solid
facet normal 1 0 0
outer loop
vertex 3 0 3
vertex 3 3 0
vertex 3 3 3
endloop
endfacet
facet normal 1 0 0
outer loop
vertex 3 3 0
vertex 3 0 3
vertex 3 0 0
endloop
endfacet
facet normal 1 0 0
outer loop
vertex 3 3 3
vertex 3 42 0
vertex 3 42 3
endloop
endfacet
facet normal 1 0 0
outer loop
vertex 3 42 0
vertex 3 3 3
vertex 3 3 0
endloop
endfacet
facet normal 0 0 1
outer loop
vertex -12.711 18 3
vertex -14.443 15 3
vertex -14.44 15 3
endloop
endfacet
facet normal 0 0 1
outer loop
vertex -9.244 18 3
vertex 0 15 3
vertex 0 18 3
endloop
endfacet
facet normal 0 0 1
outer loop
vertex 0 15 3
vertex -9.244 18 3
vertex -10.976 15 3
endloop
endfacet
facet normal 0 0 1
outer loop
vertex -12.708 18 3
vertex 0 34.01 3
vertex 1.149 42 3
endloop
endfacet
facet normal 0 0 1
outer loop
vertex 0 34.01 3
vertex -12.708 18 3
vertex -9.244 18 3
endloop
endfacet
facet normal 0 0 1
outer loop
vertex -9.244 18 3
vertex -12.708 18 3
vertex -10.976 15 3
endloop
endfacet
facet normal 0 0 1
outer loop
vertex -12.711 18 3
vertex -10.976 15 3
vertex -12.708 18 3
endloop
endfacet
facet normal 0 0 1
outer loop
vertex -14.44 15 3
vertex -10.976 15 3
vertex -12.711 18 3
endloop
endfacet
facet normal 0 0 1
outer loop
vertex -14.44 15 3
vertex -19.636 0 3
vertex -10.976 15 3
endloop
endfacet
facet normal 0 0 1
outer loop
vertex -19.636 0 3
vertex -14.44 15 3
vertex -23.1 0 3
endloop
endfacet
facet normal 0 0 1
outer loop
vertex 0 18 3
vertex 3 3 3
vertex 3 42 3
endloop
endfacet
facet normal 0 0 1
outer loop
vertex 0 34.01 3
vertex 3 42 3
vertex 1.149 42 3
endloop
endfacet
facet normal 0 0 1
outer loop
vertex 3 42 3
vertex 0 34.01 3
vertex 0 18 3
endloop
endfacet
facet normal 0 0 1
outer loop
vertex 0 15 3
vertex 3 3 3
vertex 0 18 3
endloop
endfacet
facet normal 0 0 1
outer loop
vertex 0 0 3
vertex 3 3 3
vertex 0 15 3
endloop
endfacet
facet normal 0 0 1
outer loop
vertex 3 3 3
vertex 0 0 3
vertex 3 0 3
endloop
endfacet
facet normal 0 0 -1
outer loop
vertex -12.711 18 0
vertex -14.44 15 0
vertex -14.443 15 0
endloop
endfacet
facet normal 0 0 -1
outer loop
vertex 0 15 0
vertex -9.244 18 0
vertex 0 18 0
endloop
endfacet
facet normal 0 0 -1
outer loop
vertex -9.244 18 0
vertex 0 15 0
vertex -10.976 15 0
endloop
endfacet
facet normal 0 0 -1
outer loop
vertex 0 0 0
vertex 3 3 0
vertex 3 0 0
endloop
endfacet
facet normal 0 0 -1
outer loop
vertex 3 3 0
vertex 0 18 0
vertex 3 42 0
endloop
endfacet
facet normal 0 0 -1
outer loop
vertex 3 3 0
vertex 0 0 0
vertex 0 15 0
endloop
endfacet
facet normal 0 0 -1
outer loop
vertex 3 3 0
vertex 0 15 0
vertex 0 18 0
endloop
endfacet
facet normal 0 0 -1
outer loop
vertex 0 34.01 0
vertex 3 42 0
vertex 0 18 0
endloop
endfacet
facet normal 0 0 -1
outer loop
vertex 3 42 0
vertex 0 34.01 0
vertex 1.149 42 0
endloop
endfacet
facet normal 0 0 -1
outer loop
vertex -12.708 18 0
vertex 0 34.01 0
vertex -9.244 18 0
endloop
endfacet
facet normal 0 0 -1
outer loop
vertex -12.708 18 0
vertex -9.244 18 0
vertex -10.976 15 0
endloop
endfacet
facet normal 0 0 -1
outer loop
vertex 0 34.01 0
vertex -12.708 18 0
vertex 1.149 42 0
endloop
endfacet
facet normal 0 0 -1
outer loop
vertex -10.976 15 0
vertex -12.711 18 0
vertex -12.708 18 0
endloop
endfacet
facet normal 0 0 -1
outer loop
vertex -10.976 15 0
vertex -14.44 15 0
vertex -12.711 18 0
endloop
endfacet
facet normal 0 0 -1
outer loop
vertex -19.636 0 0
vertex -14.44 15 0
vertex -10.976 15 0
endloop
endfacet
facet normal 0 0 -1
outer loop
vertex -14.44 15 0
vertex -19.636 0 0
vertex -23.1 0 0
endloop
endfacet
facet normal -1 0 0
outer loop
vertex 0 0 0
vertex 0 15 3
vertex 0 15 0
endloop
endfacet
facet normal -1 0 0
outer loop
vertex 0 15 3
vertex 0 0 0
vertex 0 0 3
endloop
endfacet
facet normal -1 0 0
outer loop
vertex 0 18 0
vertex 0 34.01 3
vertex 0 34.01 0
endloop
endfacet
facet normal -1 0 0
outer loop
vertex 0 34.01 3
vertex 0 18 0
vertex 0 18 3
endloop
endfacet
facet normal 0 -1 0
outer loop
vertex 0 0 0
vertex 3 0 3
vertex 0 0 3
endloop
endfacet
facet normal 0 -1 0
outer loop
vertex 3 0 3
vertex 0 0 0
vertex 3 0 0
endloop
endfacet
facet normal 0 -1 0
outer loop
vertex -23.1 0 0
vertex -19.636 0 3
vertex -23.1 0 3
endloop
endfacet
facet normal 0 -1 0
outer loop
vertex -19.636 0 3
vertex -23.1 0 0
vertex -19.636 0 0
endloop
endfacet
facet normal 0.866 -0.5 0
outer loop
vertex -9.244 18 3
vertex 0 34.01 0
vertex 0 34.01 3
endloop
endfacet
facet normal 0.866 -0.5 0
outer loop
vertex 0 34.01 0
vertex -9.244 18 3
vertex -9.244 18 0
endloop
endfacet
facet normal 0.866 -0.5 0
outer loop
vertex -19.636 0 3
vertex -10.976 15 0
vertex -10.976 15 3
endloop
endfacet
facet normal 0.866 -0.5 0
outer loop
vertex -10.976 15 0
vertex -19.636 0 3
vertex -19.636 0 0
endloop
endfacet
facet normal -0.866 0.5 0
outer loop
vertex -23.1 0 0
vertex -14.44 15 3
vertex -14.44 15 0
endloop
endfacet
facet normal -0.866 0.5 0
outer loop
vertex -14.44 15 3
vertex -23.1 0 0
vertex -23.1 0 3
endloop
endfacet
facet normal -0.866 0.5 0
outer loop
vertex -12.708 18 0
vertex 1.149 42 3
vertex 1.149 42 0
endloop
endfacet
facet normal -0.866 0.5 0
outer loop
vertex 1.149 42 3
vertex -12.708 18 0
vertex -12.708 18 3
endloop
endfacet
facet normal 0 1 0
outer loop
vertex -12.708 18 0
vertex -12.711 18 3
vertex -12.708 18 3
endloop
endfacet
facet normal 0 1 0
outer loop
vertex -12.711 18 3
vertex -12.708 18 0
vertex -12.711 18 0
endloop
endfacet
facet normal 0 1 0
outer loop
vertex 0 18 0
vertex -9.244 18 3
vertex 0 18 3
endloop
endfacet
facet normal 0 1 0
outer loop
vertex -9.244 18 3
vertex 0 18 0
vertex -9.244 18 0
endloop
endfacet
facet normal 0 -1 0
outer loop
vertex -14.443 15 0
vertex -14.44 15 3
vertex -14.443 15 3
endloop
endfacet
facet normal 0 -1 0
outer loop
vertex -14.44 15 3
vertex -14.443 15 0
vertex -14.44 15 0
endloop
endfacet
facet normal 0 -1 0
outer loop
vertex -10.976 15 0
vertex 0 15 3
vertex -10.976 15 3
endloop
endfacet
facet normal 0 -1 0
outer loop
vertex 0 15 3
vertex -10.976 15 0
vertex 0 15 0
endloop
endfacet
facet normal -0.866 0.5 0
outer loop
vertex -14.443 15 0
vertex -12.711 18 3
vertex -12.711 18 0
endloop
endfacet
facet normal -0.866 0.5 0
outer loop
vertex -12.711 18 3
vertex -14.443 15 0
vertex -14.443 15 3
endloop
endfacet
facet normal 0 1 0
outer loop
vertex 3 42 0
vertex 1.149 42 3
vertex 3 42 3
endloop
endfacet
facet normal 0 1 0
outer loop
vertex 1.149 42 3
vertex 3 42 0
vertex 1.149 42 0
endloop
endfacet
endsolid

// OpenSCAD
//A
g=3; // в некоторых местах x & z , толшина стен
y=40; 
z=5;
union(){
    difference(){
union(){
 cube([g,y,g]);
 translate([-23.1,0,0]) rotate([0,0,-30])  cube([g,y+10,g]);
 translate([y/-2.5,15,0]) cube([y-20,g,g]);
}
 translate([-40,-8,-1]) cube([60,8,g+2]);
 translate([g,3,-1]) cube([10,y,g+2]);
 translate([-34.65,0,-1]) rotate([0,0,-30]) cube([10,y,g+2]);
 translate([0,42,-1]) cube(10);
}
}  
